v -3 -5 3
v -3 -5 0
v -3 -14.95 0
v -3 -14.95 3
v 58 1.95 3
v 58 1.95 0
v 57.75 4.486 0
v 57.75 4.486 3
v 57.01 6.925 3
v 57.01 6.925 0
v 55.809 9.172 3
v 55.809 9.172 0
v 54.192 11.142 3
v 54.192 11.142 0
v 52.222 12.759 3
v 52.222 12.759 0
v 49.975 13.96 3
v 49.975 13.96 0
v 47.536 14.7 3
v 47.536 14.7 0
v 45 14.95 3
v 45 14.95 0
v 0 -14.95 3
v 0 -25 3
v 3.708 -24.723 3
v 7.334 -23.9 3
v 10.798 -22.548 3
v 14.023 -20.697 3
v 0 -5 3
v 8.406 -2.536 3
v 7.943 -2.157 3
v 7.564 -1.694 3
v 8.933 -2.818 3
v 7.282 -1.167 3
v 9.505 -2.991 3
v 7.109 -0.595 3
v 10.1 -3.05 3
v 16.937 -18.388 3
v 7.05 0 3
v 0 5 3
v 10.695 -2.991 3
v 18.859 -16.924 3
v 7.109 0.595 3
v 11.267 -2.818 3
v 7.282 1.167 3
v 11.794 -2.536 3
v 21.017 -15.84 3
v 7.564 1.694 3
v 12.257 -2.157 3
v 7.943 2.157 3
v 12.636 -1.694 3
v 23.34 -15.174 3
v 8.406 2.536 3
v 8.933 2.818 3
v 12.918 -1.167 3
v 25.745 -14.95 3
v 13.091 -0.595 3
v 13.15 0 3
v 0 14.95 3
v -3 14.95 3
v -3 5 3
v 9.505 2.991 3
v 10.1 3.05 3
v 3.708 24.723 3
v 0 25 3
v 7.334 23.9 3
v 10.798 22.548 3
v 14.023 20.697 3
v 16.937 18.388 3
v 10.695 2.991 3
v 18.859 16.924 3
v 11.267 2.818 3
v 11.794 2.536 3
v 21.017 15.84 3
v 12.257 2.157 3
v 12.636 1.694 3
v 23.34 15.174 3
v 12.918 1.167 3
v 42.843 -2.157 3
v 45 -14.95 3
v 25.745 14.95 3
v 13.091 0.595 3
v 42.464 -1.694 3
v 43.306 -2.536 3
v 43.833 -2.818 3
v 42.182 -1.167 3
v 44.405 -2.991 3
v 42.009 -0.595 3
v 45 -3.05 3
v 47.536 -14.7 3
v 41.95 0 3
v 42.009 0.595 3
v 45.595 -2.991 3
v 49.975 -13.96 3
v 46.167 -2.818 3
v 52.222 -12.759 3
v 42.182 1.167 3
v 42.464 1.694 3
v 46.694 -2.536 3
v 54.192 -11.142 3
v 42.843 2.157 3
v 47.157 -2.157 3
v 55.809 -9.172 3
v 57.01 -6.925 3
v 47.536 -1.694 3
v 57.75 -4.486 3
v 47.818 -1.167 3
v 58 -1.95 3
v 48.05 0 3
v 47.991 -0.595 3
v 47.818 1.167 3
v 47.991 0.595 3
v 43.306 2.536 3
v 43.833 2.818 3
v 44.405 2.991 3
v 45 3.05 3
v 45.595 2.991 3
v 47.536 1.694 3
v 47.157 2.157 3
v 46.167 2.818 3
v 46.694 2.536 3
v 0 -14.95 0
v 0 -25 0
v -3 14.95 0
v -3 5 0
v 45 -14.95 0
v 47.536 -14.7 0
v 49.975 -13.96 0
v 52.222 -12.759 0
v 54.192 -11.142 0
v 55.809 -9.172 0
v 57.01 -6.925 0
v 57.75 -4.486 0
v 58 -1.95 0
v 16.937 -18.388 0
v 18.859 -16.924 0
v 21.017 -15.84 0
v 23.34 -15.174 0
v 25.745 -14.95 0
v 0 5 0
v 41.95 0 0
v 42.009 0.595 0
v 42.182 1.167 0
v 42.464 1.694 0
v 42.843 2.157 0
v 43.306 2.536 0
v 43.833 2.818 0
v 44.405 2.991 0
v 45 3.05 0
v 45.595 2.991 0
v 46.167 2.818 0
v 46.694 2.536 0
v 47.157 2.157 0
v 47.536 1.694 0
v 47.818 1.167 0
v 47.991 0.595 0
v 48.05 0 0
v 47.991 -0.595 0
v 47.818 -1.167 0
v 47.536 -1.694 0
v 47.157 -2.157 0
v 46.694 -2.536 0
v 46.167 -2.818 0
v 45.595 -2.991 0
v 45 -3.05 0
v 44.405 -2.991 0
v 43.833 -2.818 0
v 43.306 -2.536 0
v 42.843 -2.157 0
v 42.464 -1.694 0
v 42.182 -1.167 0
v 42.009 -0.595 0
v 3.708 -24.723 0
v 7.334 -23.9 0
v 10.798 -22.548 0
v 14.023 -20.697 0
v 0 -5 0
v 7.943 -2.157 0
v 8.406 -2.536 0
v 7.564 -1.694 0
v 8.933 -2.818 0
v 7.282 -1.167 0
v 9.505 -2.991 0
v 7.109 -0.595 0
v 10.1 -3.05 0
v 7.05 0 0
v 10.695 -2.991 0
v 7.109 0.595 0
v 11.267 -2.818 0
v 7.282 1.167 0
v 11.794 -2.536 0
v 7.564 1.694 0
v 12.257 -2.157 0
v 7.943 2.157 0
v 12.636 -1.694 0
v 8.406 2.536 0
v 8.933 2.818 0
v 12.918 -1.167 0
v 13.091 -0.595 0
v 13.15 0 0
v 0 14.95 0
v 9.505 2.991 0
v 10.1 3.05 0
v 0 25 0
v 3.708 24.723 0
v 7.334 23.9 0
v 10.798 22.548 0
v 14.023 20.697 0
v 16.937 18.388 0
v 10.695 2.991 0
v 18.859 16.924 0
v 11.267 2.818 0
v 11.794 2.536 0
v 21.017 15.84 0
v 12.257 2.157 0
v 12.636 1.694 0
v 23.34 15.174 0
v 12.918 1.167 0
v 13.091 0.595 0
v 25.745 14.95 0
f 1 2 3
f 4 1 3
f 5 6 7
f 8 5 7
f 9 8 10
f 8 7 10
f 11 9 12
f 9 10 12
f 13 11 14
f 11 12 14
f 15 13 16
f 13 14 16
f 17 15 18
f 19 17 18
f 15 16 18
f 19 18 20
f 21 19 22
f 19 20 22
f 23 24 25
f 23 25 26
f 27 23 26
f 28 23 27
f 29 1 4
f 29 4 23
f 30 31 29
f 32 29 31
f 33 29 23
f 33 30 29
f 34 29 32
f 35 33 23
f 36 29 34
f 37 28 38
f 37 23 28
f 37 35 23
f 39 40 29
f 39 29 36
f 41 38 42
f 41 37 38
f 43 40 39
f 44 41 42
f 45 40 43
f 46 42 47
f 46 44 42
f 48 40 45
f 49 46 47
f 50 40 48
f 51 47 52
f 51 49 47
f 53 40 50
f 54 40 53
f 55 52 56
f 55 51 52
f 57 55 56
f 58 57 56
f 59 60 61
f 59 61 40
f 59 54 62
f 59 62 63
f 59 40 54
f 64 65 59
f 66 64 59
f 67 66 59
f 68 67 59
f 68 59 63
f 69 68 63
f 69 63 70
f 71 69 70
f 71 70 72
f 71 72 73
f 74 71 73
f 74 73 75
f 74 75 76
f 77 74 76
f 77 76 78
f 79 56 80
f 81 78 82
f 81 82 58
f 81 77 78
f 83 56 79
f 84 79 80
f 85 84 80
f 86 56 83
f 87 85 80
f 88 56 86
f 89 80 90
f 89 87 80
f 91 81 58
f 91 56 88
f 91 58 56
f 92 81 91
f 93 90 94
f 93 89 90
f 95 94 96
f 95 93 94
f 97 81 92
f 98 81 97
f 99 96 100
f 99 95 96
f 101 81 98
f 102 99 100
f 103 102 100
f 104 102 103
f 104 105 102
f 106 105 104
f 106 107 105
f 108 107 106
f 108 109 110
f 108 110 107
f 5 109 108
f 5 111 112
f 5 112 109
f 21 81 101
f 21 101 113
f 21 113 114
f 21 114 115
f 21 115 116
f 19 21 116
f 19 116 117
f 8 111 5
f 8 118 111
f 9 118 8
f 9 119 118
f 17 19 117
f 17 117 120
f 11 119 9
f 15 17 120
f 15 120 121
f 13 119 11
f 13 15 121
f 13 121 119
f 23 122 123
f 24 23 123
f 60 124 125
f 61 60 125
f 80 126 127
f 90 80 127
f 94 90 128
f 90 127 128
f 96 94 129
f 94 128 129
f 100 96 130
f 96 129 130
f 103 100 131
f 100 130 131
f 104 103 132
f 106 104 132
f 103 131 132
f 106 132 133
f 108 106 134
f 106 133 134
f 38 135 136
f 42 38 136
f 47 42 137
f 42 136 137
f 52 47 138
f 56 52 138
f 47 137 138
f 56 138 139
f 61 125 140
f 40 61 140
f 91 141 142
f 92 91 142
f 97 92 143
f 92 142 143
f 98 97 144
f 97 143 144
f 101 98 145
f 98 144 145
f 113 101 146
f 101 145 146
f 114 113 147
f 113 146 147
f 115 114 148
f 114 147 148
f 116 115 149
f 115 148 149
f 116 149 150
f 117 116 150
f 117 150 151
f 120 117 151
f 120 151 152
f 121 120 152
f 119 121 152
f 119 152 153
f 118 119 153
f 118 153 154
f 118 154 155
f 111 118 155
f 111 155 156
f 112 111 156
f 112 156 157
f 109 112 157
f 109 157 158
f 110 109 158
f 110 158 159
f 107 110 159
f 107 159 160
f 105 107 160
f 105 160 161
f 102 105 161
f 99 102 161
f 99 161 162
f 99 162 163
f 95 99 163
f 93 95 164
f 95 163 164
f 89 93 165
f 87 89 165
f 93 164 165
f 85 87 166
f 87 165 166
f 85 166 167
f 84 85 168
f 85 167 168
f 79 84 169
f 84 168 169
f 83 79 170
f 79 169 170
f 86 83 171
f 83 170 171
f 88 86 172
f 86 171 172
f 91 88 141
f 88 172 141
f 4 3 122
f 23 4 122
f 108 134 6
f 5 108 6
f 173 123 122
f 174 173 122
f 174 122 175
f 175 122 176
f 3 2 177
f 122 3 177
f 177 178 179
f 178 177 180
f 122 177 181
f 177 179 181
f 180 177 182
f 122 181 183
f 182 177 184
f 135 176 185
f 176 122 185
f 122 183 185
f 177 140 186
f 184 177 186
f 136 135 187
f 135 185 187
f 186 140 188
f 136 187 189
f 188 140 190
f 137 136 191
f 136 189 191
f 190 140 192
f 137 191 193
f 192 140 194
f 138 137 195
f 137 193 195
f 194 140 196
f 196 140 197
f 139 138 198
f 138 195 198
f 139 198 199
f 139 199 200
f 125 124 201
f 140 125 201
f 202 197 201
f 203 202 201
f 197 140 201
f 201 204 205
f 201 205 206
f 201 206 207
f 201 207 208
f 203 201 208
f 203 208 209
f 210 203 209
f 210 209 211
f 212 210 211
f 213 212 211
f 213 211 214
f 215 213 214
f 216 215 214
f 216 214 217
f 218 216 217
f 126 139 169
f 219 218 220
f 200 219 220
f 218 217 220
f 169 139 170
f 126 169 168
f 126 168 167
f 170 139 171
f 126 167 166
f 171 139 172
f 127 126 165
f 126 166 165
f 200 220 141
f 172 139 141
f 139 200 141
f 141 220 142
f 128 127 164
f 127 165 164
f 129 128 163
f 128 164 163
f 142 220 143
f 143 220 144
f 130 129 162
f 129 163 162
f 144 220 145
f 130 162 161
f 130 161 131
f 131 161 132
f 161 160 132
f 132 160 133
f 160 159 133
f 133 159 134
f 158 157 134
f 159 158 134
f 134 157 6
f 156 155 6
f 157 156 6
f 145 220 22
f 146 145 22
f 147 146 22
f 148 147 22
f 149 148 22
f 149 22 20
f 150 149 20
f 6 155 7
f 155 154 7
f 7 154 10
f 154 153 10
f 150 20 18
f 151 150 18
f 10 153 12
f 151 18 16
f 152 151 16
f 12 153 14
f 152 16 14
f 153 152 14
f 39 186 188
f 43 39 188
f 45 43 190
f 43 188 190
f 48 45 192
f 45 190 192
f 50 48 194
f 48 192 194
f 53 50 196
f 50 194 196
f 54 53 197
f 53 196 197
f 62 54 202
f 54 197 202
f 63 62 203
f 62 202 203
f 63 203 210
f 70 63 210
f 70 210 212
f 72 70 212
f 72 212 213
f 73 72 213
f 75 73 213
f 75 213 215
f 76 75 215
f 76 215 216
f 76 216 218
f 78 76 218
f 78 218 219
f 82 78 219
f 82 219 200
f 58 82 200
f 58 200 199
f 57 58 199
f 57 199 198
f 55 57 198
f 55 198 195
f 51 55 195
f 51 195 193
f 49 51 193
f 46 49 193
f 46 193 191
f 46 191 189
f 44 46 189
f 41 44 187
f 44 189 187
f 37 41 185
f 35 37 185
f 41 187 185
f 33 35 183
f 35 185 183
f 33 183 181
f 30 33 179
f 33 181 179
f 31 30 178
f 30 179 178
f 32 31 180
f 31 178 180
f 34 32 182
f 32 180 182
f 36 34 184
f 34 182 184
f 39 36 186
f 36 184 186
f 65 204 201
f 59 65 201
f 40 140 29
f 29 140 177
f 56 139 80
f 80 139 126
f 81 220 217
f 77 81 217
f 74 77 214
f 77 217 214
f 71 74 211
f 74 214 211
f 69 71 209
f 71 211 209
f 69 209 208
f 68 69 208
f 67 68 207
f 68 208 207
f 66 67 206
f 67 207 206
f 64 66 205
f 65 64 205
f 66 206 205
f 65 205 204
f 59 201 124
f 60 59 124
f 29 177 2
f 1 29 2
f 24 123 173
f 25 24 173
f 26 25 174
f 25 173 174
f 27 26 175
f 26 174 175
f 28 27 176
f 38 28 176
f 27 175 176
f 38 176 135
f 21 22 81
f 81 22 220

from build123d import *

# Parameters (mm, degrees)
BOSS_EXTRUDE1_DEPTH            = 3
F_6_1_6_1_DIAMETER_HOLE1_D     = 6.1
F_6_1_6_1_DIAMETER_HOLE1_DEPTH = 10
F_6_1_6_1_DIAMETER_HOLE1_TIP   = 1.832624888


with BuildPart() as part:
    # Sketch1 → Boss-Extrude1 (new body)
    with BuildSketch(Plane.XY):
        with BuildLine():
            Line((0, 25), (0, 14.95))
            Line((0, 14.95), (-3, 14.95))
            Line((-3, 14.95), (-3, 5))
            Line((-3, 5), (0, 5))
            Line((0, 5), (0, -5))
            Line((0, -5), (-3, -5))
            Line((-3, -5), (-3, -14.95))
            Line((-3, -14.95), (0, -14.95))
            Line((0, -14.95), (0, -25))
            ThreePointArc((0, -25), (9.091095991, -23.288451509), (16.937403852, -18.388157895))
            ThreePointArc((16.937403852, -18.388157895), (21.017483939, -15.840005215), (25.744853855, -14.95))
            Line((25.744853855, -14.95), (45, -14.95))
            ThreePointArc((45, -14.95), (54.192388155, -11.142388155), (58, -1.95))
            Line((58, -1.95), (58, 1.95))
            ThreePointArc((58, 1.95), (54.192388155, 11.142388155), (45, 14.95))
            Line((45, 14.95), (25.744853855, 14.95))
            ThreePointArc((25.744853855, 14.95), (21.017483939, 15.840005215), (16.937403852, 18.388157895))
            ThreePointArc((16.937403852, 18.388157895), (9.091095991, 23.288451509), (0, 25))
        make_face()
    extrude(amount=BOSS_EXTRUDE1_DEPTH)

    # Ø6.1 (6.1) Diameter Hole1
    with Locations(Plane.XY.offset(3)):
        with Locations((10.1, 0), (45, 0)):
            Hole(F_6_1_6_1_DIAMETER_HOLE1_D / 2, depth=F_6_1_6_1_DIAMETER_HOLE1_DEPTH)
            with Locations((0, 0, -(F_6_1_6_1_DIAMETER_HOLE1_DEPTH + F_6_1_6_1_DIAMETER_HOLE1_TIP / 2))):  # 118° drill point
                Cone(0, F_6_1_6_1_DIAMETER_HOLE1_D / 2, F_6_1_6_1_DIAMETER_HOLE1_TIP, mode=Mode.SUBTRACT)


solid = part.part
